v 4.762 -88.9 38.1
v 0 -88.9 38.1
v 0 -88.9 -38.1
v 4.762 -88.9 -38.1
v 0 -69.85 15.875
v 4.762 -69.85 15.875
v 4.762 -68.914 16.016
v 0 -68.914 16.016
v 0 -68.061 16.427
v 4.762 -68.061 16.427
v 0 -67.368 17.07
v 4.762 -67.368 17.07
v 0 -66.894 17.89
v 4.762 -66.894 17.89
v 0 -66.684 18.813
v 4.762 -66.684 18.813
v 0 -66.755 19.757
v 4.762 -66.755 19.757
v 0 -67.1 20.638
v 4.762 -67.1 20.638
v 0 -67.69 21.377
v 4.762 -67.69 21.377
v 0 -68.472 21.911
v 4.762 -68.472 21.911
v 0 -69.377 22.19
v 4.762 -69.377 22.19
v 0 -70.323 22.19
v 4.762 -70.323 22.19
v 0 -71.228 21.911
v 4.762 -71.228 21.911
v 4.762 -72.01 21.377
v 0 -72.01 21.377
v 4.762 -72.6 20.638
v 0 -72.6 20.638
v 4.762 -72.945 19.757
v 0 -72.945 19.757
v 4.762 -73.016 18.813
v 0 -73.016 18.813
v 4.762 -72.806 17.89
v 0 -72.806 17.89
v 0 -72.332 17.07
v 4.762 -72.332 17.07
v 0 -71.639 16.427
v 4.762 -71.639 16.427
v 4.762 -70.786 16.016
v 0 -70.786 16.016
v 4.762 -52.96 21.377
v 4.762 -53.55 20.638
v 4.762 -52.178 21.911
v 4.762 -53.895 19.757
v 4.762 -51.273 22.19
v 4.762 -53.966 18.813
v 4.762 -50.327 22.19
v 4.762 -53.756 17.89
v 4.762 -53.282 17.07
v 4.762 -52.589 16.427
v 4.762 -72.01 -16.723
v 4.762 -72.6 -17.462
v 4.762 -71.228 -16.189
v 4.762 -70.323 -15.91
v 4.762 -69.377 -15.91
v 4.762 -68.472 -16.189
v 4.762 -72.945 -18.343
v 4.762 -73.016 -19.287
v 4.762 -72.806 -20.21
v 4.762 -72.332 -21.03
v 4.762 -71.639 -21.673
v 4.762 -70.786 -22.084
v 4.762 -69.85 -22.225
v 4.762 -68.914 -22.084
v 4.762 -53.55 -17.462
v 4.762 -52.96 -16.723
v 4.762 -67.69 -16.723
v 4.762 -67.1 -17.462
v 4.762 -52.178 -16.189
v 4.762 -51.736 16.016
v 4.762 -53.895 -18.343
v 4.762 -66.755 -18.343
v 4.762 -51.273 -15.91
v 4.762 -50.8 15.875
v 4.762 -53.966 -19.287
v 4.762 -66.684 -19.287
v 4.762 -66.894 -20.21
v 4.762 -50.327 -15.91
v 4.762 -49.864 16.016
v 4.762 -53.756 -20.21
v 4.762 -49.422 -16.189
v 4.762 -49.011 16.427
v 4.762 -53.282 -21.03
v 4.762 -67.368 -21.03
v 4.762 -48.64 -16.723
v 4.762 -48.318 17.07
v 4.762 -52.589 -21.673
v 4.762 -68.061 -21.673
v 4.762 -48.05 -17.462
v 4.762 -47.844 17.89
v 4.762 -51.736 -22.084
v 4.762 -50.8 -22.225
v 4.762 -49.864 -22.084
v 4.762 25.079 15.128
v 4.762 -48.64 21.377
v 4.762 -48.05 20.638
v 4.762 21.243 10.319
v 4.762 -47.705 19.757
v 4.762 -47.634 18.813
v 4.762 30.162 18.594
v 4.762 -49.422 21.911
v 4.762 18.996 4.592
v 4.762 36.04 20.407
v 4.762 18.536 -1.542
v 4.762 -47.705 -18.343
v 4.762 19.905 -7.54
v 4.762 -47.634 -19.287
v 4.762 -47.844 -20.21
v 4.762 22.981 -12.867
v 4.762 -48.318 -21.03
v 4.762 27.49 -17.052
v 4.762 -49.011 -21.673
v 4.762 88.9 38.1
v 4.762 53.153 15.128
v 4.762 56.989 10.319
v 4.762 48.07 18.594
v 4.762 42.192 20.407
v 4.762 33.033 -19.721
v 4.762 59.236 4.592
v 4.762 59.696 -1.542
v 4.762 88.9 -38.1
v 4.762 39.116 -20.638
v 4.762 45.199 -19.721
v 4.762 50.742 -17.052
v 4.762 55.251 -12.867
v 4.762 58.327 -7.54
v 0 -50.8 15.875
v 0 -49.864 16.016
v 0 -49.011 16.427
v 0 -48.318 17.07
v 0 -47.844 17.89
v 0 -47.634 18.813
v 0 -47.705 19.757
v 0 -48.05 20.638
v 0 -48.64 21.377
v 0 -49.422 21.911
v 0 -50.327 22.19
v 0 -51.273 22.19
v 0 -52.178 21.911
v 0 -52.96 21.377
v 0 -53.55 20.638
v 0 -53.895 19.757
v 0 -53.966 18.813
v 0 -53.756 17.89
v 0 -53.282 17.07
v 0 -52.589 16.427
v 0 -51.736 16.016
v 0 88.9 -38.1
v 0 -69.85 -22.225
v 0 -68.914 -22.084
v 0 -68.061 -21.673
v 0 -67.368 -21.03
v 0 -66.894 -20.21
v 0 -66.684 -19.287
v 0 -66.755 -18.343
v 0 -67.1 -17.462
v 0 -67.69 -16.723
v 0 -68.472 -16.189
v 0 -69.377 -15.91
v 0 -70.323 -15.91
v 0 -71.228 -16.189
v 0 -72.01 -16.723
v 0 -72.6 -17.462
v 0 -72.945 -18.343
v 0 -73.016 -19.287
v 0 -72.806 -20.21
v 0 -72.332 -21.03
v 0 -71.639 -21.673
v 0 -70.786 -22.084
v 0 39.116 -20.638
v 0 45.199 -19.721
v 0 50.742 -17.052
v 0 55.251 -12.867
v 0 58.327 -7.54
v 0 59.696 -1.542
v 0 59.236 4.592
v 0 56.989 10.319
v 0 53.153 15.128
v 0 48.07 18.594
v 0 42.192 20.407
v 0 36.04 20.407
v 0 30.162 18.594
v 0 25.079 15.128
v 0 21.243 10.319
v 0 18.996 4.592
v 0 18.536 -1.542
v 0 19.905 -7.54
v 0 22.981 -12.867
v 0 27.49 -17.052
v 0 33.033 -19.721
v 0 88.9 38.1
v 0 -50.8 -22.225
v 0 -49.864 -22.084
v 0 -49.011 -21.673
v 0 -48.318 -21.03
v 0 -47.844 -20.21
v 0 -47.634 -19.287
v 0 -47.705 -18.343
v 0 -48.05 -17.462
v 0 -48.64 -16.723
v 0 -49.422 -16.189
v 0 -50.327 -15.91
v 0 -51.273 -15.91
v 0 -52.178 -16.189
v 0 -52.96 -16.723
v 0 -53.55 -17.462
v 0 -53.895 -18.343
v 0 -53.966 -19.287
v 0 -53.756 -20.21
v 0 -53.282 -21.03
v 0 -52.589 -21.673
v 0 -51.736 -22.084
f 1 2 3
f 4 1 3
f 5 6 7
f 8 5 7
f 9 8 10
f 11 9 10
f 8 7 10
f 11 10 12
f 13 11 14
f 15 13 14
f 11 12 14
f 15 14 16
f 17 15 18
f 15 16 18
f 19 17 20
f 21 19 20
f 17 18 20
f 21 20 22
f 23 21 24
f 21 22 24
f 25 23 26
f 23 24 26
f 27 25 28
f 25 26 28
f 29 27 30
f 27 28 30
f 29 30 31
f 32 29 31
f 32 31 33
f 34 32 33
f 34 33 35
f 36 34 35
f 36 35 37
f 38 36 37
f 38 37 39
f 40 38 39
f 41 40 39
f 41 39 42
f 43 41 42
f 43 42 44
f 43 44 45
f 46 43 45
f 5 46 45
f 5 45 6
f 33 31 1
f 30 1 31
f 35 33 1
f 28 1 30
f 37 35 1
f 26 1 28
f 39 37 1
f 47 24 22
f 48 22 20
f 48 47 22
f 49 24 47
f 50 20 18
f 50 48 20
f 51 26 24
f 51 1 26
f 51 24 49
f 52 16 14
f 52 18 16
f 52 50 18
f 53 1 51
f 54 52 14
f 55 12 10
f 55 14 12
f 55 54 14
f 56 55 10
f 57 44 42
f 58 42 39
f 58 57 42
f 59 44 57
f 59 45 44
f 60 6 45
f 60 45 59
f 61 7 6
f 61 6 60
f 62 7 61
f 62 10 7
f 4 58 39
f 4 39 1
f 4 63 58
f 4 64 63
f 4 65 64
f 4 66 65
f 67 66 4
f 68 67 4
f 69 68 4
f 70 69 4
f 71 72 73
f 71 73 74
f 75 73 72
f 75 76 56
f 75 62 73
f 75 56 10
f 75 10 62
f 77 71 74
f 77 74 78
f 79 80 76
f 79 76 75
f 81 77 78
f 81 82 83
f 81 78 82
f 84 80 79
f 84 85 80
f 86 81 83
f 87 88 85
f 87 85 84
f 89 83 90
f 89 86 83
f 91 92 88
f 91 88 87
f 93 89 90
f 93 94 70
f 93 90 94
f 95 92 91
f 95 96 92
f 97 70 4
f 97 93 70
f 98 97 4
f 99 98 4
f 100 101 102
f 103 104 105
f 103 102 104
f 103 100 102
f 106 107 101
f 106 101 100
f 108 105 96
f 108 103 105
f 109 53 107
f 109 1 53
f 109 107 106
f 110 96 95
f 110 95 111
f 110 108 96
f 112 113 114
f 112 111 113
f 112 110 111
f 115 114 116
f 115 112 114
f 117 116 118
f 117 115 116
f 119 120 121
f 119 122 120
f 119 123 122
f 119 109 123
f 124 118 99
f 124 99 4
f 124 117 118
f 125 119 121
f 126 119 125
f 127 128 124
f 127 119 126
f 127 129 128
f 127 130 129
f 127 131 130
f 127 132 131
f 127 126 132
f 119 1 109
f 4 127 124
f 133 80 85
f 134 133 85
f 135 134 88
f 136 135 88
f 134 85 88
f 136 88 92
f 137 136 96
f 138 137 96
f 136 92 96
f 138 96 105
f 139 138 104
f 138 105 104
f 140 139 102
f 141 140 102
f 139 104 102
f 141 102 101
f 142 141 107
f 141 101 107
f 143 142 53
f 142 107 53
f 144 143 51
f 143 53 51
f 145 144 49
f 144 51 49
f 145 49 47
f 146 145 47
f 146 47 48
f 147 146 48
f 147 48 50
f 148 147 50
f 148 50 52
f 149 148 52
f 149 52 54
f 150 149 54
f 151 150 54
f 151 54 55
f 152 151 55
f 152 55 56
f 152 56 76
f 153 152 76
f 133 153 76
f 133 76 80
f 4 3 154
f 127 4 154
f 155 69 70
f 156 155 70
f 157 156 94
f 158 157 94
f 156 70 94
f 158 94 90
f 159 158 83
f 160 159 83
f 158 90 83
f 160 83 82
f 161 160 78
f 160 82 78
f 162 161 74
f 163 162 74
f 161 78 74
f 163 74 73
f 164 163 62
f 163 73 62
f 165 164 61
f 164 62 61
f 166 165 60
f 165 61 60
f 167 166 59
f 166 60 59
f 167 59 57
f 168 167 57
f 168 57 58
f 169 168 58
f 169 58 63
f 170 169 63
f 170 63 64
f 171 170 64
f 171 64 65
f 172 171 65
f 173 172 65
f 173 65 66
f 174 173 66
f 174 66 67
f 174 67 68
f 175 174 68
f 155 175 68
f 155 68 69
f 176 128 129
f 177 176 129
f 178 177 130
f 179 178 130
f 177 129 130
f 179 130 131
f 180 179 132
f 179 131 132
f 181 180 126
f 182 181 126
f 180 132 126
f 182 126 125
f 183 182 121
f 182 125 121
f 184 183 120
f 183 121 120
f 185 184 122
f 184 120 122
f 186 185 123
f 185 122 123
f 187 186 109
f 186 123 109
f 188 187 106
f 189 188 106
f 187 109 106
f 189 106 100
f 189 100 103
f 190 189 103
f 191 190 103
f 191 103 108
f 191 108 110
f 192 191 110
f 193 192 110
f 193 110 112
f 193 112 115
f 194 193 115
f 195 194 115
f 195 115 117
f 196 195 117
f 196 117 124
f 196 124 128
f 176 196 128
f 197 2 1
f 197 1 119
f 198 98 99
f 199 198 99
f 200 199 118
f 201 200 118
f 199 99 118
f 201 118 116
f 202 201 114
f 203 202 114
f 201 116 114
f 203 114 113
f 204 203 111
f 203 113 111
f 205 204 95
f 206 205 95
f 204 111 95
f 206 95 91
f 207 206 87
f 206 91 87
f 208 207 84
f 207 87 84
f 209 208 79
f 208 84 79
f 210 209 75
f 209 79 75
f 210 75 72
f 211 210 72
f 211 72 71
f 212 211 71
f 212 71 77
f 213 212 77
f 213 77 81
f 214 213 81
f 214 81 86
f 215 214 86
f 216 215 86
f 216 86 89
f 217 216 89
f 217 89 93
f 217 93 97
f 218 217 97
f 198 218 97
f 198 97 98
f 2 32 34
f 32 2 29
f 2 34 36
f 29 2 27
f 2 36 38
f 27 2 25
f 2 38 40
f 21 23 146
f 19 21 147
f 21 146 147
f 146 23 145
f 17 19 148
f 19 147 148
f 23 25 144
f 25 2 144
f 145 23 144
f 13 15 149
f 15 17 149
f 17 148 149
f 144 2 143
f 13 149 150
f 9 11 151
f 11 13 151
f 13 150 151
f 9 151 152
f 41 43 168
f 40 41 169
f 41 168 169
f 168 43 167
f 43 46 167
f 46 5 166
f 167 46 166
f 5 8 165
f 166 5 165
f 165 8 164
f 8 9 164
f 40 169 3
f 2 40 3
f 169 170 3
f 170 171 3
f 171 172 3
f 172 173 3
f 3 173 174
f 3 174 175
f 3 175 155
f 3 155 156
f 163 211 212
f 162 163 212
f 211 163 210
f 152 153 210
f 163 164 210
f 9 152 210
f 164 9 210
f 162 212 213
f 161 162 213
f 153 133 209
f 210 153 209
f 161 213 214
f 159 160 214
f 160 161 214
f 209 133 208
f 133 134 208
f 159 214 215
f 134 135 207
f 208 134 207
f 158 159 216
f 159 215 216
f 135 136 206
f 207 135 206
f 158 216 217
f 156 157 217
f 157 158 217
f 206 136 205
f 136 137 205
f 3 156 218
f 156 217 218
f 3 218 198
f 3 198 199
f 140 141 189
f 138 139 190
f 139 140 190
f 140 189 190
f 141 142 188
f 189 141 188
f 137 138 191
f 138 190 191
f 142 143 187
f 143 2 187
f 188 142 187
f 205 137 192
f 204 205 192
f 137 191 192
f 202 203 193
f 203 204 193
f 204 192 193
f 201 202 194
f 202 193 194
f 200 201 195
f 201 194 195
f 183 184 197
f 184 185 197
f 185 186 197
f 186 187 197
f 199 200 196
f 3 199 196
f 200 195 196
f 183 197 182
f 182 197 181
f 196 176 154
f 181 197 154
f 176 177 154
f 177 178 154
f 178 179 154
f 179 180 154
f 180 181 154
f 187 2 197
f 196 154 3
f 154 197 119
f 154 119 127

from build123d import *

# Parameters (mm, degrees)
SKETCH1_W           = 76.2
SKETCH1_H           = 177.8
BOSS_EXTRUDE1_DEPTH = 4.7625
CUT_EXTRUDE1_REACH  = 98.838
SKETCH2_R           = 20.6375
CUT_EXTRUDE2_REACH  = 98.838
SKETCH4_R           = 3.175


with BuildPart() as part:
    # Sketch1 → Boss-Extrude1 (new body)
    with BuildSketch(Plane(origin=(0, 0, 0), x_dir=(0, 0, -1), z_dir=(1, 0, 0))):
        Rectangle(SKETCH1_W, SKETCH1_H)
    extrude(amount=BOSS_EXTRUDE1_DEPTH)

    # Sketch2 → Cut-Extrude1 (cut, up to next)
    with BuildSketch(Plane(origin=(4.7625, 0, 0), x_dir=(0, 0, -1), z_dir=(1, 0, 0)), mode=Mode.PRIVATE) as cut_extrude1_sk1:
        with Locations((0, 39.116)):
            Circle(SKETCH2_R)
    cut_extrude1_tool1 = extrude(cut_extrude1_sk1.sketch, amount=-CUT_EXTRUDE1_REACH, mode=Mode.PRIVATE) & part.part
    add(cut_extrude1_tool1.solids().sort_by_distance((4.7625, 39.116, 0))[0], mode=Mode.SUBTRACT)

    # Sketch4 → Cut-Extrude2 (cut, up to next)
    with BuildSketch(Plane(origin=(4.7625, 0, 0), x_dir=(0, 0, -1), z_dir=(1, 0, 0)), mode=Mode.PRIVATE) as cut_extrude2_sk1:
        with Locations((-19.05, -50.8)):
            Circle(SKETCH4_R)
    cut_extrude2_tool1 = extrude(cut_extrude2_sk1.sketch, amount=-CUT_EXTRUDE2_REACH, mode=Mode.PRIVATE) & part.part
    # Sketch4 → Cut-Extrude2 (cut, up to next)
    with BuildSketch(Plane(origin=(4.7625, 0, 0), x_dir=(0, 0, -1), z_dir=(1, 0, 0)), mode=Mode.PRIVATE) as cut_extrude2_sk2:
        with Locations((19.05, -50.8)):
            Circle(SKETCH4_R)
    cut_extrude2_tool2 = extrude(cut_extrude2_sk2.sketch, amount=-CUT_EXTRUDE2_REACH, mode=Mode.PRIVATE) & part.part
    # Sketch4 → Cut-Extrude2 (cut, up to next)
    with BuildSketch(Plane(origin=(4.7625, 0, 0), x_dir=(0, 0, -1), z_dir=(1, 0, 0)), mode=Mode.PRIVATE) as cut_extrude2_sk3:
        with Locations((19.05, -69.85)):
            Circle(SKETCH4_R)
    cut_extrude2_tool3 = extrude(cut_extrude2_sk3.sketch, amount=-CUT_EXTRUDE2_REACH, mode=Mode.PRIVATE) & part.part
    # Sketch4 → Cut-Extrude2 (cut, up to next)
    with BuildSketch(Plane(origin=(4.7625, 0, 0), x_dir=(0, 0, -1), z_dir=(1, 0, 0)), mode=Mode.PRIVATE) as cut_extrude2_sk4:
        with Locations((-19.05, -69.85)):
            Circle(SKETCH4_R)
    cut_extrude2_tool4 = extrude(cut_extrude2_sk4.sketch, amount=-CUT_EXTRUDE2_REACH, mode=Mode.PRIVATE) & part.part
    add(cut_extrude2_tool1.solids().sort_by_distance((4.7625, -50.8, 19.05))[0], mode=Mode.SUBTRACT)
    add(cut_extrude2_tool2.solids().sort_by_distance((4.7625, -50.8, -19.05))[0], mode=Mode.SUBTRACT)
    add(cut_extrude2_tool3.solids().sort_by_distance((4.7625, -69.85, -19.05))[0], mode=Mode.SUBTRACT)
    add(cut_extrude2_tool4.solids().sort_by_distance((4.7625, -69.85, 19.05))[0], mode=Mode.SUBTRACT)


solid = part.part
